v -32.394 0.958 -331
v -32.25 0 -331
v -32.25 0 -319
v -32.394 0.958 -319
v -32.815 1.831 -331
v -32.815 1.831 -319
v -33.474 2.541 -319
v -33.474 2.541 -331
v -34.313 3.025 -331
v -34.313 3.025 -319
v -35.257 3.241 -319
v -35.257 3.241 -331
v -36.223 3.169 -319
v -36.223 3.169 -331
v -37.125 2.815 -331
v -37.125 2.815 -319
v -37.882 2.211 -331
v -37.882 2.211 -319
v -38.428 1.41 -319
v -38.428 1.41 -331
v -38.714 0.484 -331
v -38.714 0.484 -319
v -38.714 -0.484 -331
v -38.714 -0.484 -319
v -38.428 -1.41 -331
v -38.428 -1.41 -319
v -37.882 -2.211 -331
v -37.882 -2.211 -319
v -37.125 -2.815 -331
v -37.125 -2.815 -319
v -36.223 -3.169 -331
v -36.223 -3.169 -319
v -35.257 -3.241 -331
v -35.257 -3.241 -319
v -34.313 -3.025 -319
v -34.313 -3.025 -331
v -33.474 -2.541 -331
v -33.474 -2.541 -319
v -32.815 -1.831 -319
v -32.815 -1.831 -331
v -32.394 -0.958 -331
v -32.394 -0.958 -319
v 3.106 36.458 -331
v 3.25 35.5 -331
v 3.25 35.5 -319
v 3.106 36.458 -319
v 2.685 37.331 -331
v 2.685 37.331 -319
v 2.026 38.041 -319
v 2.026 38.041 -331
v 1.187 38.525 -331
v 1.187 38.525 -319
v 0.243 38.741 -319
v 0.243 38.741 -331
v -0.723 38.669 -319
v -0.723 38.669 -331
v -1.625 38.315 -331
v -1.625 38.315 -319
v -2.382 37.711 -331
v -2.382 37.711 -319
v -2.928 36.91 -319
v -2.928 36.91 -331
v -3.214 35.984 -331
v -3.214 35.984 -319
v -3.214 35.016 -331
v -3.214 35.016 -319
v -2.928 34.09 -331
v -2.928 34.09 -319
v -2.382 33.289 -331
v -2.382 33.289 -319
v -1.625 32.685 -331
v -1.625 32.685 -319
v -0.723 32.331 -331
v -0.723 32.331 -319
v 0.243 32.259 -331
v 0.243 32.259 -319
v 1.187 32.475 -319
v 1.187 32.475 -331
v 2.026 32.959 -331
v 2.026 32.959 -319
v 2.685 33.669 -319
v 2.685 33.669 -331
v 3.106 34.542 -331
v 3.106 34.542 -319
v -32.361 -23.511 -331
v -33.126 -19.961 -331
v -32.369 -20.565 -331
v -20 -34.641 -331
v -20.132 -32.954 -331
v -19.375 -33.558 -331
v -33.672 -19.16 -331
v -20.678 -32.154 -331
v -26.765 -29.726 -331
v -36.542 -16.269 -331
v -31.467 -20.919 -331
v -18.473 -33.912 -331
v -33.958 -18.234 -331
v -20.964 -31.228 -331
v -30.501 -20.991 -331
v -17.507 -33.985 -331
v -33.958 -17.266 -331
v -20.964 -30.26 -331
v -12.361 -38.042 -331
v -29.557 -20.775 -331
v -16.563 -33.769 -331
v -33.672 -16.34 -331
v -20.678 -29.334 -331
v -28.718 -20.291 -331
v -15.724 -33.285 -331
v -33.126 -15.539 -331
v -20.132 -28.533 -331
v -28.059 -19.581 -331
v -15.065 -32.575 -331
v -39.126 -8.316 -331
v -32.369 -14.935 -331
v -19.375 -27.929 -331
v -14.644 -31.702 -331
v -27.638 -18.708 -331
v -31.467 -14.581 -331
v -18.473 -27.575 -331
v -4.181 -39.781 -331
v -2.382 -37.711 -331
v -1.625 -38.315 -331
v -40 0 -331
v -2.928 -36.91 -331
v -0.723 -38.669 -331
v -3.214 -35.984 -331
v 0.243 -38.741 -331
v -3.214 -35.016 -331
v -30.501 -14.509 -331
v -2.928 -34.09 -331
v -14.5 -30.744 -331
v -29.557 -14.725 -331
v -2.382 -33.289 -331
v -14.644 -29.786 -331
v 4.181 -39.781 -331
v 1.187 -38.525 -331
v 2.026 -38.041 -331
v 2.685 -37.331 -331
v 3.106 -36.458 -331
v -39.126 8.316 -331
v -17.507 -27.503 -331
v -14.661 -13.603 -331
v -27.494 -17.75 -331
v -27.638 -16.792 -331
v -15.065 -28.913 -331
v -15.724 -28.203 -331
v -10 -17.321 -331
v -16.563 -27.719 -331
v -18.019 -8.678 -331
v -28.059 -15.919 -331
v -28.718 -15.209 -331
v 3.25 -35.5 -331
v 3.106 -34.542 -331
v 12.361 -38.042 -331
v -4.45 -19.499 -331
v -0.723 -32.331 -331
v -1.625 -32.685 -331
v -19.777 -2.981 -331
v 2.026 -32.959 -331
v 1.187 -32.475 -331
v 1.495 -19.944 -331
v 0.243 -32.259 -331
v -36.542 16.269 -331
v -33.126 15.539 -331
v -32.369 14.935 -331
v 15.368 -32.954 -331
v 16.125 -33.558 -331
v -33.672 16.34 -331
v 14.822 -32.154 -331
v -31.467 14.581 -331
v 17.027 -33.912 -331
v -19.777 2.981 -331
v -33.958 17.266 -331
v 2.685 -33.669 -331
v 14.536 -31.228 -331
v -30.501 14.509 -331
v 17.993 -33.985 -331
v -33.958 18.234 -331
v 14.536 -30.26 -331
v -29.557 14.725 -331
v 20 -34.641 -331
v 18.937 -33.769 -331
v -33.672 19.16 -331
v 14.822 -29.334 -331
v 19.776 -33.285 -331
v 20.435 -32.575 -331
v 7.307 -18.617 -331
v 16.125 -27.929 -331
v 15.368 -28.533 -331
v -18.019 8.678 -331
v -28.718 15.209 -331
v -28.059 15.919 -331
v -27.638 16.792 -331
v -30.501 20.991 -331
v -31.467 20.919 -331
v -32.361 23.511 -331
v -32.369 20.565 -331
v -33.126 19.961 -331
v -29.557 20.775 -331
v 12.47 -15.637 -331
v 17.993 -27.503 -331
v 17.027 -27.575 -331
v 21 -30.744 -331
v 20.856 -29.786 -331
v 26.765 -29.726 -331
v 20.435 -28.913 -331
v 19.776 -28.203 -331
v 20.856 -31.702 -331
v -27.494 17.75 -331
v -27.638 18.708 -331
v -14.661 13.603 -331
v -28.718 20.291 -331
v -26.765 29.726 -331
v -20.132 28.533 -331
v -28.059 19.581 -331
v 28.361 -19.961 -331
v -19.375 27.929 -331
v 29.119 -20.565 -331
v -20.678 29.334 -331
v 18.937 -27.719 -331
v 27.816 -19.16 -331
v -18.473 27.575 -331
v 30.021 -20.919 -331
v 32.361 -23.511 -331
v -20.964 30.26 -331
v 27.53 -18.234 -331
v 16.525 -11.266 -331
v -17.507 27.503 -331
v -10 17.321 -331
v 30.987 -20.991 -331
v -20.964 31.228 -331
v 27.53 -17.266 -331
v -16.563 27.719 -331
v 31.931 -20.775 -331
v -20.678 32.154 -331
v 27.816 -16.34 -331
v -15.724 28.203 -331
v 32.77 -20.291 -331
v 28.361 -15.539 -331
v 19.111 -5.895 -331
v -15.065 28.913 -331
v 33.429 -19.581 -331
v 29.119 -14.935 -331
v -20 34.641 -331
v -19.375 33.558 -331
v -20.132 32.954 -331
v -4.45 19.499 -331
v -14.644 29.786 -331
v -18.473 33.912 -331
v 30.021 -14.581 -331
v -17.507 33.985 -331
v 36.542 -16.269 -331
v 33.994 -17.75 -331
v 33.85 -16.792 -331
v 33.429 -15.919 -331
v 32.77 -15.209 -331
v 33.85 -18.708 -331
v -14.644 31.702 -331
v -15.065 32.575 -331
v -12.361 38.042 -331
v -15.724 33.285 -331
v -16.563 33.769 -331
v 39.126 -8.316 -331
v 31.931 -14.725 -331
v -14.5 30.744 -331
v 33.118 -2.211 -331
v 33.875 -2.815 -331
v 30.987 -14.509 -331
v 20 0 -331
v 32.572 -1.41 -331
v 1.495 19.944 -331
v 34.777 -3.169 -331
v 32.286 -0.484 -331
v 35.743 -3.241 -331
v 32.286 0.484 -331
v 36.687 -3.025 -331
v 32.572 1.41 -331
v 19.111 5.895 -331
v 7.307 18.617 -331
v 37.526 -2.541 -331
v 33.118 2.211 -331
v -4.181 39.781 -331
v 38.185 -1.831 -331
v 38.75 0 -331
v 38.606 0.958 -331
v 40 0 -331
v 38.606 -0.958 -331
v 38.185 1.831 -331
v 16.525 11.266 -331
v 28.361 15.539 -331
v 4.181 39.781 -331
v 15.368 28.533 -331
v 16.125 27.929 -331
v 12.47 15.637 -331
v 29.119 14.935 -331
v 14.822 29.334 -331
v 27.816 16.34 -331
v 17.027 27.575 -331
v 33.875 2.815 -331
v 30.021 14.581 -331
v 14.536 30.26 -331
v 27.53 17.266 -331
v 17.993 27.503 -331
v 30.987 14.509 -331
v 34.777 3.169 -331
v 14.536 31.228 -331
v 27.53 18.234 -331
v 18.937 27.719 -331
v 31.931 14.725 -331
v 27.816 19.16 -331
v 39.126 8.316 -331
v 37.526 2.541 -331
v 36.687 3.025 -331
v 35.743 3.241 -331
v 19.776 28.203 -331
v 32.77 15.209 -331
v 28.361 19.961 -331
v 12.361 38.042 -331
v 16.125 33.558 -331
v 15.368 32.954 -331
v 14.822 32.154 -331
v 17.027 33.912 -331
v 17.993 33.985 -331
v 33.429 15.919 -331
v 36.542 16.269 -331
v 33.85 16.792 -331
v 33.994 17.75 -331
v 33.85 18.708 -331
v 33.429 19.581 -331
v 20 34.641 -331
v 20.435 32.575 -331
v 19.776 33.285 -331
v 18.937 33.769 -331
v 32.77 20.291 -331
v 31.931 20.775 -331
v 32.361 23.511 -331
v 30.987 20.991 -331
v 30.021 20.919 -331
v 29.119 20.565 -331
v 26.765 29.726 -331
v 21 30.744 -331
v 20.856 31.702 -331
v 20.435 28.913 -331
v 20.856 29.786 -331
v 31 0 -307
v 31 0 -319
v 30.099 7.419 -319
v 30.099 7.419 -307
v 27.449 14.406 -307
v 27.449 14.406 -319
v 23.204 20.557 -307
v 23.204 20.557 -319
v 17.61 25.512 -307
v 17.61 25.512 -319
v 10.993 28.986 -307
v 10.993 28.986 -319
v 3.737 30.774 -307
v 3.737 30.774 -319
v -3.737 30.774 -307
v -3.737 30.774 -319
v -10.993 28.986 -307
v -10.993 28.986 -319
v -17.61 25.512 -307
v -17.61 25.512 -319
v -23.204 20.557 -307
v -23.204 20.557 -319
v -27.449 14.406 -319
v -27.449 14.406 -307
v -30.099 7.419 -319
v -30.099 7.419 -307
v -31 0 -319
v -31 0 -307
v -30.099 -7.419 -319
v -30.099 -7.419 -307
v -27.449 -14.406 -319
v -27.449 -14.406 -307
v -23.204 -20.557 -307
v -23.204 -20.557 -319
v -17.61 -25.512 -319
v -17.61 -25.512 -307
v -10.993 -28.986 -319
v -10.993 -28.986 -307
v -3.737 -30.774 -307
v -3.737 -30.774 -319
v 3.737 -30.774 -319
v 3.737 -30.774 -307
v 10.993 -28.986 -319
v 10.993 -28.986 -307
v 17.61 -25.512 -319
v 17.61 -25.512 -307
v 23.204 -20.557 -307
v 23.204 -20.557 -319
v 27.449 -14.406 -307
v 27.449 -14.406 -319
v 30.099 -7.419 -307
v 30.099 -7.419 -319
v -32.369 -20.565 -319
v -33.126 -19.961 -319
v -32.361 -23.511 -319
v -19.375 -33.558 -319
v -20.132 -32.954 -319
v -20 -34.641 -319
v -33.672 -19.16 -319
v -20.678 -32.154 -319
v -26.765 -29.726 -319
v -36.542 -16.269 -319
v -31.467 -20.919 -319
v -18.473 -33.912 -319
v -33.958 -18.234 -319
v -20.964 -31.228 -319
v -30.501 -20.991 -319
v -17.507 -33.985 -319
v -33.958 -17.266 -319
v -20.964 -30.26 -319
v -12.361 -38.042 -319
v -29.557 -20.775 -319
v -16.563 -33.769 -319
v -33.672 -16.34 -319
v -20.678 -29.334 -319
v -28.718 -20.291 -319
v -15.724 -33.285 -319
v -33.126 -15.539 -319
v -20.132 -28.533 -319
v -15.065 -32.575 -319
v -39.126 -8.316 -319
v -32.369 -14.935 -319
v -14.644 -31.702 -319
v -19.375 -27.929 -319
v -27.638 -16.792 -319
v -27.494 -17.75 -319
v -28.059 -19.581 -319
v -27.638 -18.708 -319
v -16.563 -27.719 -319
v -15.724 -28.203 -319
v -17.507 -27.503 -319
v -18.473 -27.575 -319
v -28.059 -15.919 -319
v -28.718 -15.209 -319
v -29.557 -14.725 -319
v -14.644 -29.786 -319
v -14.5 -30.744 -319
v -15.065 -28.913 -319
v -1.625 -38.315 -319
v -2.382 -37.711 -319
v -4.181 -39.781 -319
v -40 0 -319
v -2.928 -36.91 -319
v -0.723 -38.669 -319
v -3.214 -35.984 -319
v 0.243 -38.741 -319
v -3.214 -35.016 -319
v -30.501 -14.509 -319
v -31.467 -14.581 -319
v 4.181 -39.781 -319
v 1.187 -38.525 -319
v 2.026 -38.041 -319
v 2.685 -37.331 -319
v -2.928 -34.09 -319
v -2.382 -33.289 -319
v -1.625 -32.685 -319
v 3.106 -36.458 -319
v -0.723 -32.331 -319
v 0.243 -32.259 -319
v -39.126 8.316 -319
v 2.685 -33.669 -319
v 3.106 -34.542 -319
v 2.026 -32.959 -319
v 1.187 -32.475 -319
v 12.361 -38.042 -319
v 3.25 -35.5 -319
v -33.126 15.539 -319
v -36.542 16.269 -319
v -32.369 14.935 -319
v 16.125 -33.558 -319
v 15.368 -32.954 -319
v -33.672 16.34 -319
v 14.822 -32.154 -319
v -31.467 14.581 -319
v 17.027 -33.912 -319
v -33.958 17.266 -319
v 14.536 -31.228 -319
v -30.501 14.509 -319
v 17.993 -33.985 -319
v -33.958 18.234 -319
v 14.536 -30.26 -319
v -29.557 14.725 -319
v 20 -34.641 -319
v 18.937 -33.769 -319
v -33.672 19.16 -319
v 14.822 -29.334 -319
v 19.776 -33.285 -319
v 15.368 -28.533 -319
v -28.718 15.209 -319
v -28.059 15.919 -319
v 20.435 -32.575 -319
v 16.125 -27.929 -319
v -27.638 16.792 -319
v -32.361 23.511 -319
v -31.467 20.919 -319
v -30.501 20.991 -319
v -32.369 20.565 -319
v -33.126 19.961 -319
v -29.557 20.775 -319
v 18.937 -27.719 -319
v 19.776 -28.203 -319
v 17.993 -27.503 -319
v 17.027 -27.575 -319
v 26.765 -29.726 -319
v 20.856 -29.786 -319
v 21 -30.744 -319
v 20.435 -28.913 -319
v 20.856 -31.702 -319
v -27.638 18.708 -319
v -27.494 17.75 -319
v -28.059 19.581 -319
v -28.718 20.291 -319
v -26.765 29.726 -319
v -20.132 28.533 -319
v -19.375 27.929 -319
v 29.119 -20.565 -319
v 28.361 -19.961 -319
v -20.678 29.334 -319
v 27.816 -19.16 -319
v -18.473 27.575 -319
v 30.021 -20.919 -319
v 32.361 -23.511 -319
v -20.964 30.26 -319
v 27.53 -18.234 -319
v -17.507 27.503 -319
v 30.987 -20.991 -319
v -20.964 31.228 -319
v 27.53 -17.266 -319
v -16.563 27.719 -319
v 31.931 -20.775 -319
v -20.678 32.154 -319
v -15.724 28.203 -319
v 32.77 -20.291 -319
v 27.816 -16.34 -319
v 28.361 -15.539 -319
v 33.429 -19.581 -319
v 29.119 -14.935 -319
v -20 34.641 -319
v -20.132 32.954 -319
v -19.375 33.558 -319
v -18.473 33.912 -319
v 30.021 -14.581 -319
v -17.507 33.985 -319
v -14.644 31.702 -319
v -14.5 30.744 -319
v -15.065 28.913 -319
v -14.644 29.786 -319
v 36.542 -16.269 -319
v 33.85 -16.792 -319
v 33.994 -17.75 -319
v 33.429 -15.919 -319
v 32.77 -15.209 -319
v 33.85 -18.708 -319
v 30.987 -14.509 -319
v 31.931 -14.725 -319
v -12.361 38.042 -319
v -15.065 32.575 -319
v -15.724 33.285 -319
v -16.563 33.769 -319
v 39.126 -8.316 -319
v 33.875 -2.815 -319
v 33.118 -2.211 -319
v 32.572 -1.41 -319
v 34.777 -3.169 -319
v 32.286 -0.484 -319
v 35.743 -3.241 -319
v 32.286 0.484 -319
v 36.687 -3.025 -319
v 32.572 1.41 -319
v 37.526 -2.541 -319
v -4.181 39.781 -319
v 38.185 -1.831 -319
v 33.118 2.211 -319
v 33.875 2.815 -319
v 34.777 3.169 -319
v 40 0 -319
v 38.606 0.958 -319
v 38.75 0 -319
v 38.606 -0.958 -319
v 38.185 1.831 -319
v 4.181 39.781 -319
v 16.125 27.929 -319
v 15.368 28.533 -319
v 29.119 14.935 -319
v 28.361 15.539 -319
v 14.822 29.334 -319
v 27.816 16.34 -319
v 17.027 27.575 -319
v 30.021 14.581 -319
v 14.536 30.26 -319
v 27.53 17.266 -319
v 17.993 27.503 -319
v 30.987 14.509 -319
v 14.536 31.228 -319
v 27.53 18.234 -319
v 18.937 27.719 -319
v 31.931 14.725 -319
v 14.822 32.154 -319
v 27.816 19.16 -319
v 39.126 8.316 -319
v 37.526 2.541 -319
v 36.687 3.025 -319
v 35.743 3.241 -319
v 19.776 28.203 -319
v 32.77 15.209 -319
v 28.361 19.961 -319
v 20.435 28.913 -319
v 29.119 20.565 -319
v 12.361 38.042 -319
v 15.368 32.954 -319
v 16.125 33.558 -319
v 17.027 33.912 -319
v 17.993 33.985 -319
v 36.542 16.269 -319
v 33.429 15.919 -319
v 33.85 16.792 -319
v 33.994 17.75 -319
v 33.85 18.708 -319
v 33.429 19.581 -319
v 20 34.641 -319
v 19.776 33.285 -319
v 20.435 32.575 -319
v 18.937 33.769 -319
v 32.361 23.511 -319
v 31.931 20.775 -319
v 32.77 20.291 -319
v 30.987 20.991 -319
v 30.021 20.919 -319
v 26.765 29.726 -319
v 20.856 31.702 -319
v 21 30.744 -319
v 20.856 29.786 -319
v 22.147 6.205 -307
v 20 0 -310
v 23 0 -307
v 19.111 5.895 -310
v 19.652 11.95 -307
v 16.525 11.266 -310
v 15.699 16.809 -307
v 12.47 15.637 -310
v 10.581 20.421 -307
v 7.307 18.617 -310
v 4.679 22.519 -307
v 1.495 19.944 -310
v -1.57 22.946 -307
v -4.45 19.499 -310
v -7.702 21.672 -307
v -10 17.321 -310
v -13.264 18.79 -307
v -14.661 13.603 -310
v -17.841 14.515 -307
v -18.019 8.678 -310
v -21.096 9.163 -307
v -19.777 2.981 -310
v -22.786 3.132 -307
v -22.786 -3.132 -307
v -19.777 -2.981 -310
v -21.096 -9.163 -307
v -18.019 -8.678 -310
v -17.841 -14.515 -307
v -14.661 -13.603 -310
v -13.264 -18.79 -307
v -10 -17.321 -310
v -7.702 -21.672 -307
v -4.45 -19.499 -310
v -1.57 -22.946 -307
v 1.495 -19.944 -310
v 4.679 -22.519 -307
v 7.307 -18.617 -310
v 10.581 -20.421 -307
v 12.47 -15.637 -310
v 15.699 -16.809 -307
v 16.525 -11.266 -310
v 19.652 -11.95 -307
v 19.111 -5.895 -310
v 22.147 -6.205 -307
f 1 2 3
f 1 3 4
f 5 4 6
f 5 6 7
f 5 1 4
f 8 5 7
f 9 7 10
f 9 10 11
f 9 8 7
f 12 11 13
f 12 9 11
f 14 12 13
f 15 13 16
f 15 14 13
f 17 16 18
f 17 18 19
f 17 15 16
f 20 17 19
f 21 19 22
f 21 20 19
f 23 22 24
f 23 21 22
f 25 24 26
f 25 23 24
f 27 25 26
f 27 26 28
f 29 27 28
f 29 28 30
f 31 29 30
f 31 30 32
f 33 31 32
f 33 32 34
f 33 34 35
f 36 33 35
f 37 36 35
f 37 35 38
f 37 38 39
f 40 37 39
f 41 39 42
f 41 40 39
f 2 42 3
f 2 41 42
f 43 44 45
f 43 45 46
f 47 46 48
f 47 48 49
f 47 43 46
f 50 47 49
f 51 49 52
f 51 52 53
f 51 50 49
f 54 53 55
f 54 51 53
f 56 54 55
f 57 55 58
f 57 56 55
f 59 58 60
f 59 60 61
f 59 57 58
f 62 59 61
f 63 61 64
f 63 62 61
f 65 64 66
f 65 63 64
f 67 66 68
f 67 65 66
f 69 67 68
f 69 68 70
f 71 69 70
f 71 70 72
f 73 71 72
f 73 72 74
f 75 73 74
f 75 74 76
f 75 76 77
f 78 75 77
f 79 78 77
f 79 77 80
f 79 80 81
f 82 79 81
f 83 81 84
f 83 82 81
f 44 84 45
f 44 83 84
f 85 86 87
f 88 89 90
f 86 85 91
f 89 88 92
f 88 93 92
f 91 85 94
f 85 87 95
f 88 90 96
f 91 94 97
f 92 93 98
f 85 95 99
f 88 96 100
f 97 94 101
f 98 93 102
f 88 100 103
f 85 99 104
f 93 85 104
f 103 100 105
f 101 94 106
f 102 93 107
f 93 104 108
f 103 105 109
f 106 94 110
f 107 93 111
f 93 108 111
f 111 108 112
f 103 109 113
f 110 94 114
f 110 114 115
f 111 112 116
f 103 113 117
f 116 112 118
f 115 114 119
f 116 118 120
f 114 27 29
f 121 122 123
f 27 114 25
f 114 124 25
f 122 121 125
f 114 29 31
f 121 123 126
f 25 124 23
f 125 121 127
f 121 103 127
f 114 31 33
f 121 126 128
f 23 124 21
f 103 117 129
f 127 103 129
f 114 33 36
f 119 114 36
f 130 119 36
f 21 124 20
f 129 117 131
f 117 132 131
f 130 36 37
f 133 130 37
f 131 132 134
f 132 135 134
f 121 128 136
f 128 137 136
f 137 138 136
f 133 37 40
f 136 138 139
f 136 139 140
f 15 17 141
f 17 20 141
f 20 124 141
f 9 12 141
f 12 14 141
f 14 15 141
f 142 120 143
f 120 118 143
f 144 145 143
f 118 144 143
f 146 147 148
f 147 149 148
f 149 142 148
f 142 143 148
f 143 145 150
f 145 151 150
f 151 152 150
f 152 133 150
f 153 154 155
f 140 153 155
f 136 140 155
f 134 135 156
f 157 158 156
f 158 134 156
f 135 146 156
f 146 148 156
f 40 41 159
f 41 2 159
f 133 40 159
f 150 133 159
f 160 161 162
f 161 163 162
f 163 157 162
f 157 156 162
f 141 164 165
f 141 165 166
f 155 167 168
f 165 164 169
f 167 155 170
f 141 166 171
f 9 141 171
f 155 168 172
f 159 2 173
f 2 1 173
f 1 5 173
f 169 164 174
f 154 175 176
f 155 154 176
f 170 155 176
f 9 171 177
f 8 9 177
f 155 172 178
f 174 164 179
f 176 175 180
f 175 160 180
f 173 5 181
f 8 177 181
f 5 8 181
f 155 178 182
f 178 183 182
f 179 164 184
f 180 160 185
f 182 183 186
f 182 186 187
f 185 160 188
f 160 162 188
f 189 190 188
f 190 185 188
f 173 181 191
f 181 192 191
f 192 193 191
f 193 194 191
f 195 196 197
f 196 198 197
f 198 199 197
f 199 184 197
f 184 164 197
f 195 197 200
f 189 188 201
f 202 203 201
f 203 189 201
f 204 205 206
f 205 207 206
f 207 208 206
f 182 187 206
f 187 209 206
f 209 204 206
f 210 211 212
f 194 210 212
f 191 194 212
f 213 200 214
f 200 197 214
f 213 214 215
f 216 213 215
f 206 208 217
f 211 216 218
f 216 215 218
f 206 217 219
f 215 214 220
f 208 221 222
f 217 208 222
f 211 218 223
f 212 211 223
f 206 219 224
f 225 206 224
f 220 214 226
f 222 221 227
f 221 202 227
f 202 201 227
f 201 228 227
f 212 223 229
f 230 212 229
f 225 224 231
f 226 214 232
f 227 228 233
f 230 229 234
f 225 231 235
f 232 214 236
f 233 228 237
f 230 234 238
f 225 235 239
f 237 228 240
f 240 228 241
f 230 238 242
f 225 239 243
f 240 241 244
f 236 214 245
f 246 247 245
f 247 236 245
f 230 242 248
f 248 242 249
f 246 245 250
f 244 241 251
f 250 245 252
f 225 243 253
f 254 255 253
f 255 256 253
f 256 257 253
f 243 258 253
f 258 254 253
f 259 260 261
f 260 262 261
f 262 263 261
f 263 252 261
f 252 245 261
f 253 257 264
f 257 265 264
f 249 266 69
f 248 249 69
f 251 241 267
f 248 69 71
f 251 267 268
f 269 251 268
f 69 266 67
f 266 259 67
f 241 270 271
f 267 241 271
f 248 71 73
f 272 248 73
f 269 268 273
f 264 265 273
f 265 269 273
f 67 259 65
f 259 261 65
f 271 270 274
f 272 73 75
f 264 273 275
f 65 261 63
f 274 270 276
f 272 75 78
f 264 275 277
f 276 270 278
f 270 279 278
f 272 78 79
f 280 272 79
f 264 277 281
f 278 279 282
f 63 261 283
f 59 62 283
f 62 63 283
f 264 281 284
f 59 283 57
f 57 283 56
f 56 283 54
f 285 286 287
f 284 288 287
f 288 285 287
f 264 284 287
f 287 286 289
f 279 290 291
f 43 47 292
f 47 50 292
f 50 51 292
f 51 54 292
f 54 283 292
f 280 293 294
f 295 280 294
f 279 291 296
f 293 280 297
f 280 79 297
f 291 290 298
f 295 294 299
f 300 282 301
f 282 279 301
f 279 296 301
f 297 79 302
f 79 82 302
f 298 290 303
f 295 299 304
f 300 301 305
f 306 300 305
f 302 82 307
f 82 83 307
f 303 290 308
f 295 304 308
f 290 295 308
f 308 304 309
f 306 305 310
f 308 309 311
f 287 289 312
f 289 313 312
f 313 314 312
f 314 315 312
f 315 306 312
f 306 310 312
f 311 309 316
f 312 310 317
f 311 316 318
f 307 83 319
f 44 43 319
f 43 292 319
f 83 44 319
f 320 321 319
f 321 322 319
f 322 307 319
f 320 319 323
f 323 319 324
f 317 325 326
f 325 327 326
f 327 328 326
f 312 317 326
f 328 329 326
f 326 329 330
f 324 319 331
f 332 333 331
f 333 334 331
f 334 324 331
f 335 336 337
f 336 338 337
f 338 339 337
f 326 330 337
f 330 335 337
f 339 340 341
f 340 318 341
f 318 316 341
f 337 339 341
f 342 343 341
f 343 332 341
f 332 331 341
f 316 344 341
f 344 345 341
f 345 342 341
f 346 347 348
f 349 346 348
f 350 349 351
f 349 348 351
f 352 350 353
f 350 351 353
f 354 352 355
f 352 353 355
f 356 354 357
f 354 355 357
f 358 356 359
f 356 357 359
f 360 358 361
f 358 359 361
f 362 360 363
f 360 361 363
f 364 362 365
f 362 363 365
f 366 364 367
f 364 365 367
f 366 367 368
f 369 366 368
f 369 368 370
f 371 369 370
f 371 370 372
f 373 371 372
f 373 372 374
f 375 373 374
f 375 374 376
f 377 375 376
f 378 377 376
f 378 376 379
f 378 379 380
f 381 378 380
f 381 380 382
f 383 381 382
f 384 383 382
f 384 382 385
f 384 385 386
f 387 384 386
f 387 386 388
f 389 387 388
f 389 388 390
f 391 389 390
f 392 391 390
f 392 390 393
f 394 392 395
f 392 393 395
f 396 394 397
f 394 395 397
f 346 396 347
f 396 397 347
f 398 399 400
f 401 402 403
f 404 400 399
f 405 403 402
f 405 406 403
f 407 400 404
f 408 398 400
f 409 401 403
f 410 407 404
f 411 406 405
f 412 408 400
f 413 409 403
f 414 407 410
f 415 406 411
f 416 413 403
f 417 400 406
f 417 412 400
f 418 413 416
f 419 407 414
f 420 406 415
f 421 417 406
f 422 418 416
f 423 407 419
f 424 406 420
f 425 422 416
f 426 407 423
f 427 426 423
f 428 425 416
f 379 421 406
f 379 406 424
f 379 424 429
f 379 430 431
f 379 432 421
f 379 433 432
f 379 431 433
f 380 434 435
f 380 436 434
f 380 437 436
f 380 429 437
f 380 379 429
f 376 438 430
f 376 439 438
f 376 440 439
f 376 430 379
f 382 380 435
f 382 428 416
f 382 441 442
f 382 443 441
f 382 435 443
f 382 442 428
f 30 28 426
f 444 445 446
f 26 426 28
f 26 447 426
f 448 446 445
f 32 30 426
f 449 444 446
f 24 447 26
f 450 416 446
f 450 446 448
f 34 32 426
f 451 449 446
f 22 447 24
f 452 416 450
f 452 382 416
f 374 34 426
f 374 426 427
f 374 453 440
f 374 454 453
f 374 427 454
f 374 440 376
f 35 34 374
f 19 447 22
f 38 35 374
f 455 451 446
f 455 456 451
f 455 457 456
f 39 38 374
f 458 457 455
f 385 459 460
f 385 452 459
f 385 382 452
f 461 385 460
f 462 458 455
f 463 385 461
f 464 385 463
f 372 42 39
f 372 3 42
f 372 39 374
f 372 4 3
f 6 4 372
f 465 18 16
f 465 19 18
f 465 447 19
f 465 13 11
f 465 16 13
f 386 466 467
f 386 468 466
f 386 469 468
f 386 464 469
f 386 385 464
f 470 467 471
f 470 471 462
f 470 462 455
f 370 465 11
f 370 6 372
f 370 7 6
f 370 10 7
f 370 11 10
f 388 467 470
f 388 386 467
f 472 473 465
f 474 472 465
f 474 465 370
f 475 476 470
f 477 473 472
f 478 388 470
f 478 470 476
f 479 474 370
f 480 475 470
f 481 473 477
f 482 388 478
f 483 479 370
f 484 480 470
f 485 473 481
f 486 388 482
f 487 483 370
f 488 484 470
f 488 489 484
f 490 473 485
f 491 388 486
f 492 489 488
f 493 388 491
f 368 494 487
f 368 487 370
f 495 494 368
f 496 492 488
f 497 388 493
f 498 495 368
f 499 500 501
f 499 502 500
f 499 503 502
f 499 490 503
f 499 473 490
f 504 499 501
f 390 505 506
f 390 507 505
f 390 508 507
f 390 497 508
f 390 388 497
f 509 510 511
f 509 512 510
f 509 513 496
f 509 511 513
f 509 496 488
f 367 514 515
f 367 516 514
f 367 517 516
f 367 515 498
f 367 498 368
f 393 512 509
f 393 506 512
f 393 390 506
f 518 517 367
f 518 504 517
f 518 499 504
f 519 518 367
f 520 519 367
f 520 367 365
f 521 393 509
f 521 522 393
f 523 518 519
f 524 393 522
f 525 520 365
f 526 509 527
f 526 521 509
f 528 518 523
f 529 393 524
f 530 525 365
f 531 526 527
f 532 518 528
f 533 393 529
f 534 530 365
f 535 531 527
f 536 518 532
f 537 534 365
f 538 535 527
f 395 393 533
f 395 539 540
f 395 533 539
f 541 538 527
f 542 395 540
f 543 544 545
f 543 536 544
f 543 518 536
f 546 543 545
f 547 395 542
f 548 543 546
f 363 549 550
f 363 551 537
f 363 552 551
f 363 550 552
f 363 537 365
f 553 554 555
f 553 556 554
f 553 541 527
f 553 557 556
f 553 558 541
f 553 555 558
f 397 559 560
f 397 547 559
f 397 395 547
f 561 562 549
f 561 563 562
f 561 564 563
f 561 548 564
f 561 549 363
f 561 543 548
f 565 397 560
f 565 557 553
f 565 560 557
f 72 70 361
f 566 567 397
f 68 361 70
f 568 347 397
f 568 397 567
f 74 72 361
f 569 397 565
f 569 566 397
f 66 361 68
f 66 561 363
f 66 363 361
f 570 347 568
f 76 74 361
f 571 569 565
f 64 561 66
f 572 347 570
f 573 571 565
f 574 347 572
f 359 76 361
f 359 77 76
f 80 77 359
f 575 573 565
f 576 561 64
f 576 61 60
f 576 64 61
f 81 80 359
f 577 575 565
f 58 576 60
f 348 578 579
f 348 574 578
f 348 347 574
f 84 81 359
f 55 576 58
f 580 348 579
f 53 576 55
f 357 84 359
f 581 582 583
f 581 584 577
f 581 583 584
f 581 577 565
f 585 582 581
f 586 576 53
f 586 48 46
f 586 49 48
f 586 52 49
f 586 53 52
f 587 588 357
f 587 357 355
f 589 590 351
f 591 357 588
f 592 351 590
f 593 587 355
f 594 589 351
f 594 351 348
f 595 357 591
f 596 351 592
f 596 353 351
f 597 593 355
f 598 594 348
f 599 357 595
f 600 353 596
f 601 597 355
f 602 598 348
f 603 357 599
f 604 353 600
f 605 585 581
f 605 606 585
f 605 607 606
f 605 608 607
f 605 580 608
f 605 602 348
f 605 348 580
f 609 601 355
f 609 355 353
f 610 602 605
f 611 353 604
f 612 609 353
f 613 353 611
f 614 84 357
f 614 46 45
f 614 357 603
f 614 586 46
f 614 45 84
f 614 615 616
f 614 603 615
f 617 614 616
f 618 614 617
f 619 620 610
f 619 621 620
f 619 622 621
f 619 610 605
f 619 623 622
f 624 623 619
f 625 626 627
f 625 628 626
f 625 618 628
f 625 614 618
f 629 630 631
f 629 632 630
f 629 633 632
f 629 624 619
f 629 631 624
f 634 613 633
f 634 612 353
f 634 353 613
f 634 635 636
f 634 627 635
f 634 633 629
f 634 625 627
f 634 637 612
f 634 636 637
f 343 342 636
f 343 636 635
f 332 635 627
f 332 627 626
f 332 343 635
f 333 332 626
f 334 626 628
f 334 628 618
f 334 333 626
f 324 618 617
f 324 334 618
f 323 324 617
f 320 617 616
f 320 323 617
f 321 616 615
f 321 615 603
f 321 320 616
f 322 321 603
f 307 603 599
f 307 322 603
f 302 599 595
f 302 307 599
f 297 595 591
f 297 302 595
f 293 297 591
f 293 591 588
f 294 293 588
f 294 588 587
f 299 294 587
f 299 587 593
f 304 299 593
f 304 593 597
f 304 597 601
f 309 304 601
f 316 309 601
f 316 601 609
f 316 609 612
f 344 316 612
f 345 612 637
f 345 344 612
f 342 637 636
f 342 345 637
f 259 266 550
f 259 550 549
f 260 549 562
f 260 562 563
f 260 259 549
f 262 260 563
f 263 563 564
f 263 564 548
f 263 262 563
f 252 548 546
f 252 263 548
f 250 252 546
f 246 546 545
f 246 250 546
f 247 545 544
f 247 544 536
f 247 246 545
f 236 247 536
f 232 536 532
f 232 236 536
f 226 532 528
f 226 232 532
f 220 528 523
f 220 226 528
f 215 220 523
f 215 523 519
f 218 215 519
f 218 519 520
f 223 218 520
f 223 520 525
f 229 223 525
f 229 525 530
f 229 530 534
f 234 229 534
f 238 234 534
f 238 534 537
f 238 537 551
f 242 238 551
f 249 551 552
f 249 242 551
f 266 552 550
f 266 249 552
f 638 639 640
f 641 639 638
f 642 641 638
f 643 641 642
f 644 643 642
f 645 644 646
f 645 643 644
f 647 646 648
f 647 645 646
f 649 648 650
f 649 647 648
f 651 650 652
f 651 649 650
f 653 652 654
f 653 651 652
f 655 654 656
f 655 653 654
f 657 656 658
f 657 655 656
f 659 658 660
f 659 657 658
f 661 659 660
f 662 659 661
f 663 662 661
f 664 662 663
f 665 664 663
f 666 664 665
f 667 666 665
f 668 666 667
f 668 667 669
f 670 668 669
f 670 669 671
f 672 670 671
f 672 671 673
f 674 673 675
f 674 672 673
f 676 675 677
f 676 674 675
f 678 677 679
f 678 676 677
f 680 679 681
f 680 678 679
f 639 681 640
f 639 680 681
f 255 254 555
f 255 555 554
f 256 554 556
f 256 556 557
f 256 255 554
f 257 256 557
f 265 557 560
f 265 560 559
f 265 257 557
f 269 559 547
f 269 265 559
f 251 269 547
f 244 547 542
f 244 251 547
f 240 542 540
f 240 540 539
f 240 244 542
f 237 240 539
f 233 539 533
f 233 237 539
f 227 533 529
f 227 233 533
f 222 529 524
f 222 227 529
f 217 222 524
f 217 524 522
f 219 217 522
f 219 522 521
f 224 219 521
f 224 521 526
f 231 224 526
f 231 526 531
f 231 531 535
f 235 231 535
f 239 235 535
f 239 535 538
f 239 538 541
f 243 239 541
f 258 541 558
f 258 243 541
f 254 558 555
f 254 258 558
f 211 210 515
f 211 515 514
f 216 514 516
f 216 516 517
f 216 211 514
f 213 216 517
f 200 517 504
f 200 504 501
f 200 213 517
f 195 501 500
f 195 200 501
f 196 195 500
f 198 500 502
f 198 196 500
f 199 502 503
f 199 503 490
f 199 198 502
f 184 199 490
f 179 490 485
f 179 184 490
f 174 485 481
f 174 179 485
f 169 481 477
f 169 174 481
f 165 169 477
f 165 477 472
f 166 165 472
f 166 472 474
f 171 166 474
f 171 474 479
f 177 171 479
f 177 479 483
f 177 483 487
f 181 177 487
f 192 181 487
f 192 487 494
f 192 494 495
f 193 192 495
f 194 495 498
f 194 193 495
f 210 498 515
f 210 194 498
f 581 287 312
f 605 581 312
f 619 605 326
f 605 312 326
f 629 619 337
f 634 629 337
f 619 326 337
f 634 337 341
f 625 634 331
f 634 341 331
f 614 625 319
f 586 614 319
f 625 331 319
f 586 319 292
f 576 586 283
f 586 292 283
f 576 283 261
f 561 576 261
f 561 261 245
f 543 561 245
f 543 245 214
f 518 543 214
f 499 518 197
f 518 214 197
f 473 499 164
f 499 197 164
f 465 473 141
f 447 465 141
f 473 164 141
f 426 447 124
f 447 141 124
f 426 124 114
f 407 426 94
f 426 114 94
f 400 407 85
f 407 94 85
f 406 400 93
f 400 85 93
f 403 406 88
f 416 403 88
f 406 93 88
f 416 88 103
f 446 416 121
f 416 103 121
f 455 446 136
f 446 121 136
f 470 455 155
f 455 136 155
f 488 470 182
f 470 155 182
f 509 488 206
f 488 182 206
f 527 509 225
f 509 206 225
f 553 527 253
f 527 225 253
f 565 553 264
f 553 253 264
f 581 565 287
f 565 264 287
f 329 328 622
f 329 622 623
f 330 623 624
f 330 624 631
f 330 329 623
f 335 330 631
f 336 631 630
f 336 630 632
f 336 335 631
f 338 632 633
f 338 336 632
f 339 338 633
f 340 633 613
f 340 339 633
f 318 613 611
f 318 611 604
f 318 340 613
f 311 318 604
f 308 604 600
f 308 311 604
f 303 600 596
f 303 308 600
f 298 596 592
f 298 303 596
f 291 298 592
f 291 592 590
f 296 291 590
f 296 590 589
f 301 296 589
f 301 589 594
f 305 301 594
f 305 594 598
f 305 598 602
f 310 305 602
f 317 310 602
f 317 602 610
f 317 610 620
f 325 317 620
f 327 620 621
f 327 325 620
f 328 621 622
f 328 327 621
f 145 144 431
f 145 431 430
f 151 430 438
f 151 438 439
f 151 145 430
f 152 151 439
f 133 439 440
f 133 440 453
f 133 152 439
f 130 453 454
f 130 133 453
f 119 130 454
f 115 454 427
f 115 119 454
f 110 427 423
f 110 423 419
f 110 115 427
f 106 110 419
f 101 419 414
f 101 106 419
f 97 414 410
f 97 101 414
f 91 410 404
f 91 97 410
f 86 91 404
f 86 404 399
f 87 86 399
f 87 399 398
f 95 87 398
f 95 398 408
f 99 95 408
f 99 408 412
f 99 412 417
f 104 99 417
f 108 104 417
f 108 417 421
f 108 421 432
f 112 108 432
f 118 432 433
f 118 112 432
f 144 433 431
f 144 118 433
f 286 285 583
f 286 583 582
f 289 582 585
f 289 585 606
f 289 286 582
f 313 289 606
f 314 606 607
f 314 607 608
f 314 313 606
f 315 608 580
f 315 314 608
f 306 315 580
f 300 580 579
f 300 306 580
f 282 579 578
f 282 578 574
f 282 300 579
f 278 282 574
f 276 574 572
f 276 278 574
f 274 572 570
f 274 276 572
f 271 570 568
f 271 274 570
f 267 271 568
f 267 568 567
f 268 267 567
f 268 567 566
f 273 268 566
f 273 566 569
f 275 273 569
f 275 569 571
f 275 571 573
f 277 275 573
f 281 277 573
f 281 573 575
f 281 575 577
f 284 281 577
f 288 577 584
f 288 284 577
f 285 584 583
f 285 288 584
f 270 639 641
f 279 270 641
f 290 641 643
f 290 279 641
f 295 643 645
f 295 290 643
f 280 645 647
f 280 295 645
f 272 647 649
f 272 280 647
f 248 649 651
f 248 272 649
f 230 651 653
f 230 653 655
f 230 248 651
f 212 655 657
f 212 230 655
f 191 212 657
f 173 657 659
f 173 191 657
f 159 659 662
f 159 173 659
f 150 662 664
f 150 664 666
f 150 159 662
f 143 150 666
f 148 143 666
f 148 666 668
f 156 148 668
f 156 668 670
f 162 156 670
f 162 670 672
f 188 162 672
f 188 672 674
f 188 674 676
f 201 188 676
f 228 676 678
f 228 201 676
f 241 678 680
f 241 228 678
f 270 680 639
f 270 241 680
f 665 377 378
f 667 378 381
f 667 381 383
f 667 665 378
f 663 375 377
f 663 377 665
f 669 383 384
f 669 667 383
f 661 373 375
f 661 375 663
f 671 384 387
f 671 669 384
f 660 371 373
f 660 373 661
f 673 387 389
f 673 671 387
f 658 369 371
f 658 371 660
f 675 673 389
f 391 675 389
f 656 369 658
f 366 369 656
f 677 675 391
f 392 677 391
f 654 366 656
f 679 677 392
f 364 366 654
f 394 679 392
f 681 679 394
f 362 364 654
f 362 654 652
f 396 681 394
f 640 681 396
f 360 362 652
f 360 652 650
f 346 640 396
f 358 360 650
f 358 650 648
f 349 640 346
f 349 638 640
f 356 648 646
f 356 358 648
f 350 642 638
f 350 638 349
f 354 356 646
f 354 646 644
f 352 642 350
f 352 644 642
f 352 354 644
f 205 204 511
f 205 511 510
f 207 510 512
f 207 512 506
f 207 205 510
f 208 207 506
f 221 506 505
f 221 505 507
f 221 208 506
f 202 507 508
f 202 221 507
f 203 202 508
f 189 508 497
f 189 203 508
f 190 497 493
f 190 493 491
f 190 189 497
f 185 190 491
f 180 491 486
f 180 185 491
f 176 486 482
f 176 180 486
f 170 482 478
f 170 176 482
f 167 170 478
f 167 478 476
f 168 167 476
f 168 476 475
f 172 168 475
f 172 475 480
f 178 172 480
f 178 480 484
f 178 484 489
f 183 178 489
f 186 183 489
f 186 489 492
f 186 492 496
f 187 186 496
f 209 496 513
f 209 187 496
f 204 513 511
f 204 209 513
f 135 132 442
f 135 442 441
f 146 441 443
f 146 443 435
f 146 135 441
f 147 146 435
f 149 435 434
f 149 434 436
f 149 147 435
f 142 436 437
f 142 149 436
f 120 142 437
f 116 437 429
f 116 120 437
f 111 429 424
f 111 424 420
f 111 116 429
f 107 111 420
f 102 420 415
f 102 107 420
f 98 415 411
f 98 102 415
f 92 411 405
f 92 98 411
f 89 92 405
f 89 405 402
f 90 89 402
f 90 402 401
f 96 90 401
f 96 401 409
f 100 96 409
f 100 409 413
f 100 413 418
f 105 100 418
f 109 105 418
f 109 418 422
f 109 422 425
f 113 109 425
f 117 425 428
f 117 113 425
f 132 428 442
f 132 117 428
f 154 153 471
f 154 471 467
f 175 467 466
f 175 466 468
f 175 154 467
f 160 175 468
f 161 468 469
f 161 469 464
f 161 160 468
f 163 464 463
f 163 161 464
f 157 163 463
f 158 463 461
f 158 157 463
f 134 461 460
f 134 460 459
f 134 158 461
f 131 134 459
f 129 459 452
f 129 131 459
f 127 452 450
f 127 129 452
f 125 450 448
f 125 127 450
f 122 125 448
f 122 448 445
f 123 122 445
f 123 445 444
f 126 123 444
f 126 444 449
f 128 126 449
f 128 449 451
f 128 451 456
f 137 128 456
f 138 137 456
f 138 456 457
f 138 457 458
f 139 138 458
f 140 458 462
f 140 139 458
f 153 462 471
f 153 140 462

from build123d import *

# Parameters (mm, degrees)
STOCK_PPV4_2_START                       = -331
STOCK_PPV4_2_EXTRUDER_MB_1_OUTLINE_R     = 31
STOCK_PPV4_2_EXTRUDER_MB_1_OUTLINE_R_2   = 20
STOCK_PPV4_2_EXTRUDER_MB_1_DEPTH         = 24
STOCK_PPV4_2_EXTRUDER_MB_1_2_OUTLINE_R   = 40
STOCK_PPV4_2_EXTRUDER_MB_1_2_OUTLINE_R_2 = 3.3
STOCK_PPV4_2_EXTRUDER_MB_1_2_OUTLINE_R_3 = 31
STOCK_PPV4_2_EXTRUDER_MB_1_2_DEPTH       = 12
MOVE_FACE1_BY                            = 0.05
MOVE_FACE1_2_BY                          = 0.05
MOVE_FACE1_3_BY                          = 0.05
MOVE_FACE1_4_BY                          = 0.05
MOVE_FACE1_5_BY                          = 0.05
MOVE_FACE1_6_BY                          = 0.05
MOVE_FACE1_7_BY                          = 0.05
MOVE_FACE1_8_BY                          = 0.05
MOVE_FACE1_9_BY                          = 0.05
MOVE_FACE1_10_BY                         = 0.05
MOVE_FACE1_11_BY                         = 0.05
MOVE_FACE1_12_BY                         = 0.05
CHAMFER1_SIZE                            = 3


# Read off the part's stored shape, not the designer's step: Stock-PPV4.2 - Extruder - MB-1
with BuildPart() as part:
    # Stock-PPV4.2 - Extruder - MB-1 outline → Stock-PPV4.2 - Extruder - MB-1 (new body)
    with BuildSketch(Plane.XY.offset(STOCK_PPV4_2_START)):
        Circle(STOCK_PPV4_2_EXTRUDER_MB_1_OUTLINE_R)
        Circle(STOCK_PPV4_2_EXTRUDER_MB_1_OUTLINE_R_2, mode=Mode.SUBTRACT)
    extrude(amount=STOCK_PPV4_2_EXTRUDER_MB_1_DEPTH)

    # Stock-PPV4.2 - Extruder - MB-1 2 outline → Stock-PPV4.2 - Extruder - MB-1 2 (add)
    with BuildSketch(Plane.XY.offset(STOCK_PPV4_2_START)):
        Circle(STOCK_PPV4_2_EXTRUDER_MB_1_2_OUTLINE_R)
        with Locations((-17.75, -30.743901834)):
            Circle(STOCK_PPV4_2_EXTRUDER_MB_1_2_OUTLINE_R_2, mode=Mode.SUBTRACT)
        with Locations((-30.743901834, -17.75)):
            Circle(STOCK_PPV4_2_EXTRUDER_MB_1_2_OUTLINE_R_2, mode=Mode.SUBTRACT)
        with Locations((0, -35.5)):
            Circle(STOCK_PPV4_2_EXTRUDER_MB_1_2_OUTLINE_R_2, mode=Mode.SUBTRACT)
        with Locations((17.75, -30.743901834)):
            Circle(STOCK_PPV4_2_EXTRUDER_MB_1_2_OUTLINE_R_2, mode=Mode.SUBTRACT)
        with Locations((30.743901834, -17.75)):
            Circle(STOCK_PPV4_2_EXTRUDER_MB_1_2_OUTLINE_R_2, mode=Mode.SUBTRACT)
        with Locations((-35.5, 0)):
            Circle(STOCK_PPV4_2_EXTRUDER_MB_1_2_OUTLINE_R_2, mode=Mode.SUBTRACT)
        with Locations((-30.743901834, 17.75)):
            Circle(STOCK_PPV4_2_EXTRUDER_MB_1_2_OUTLINE_R_2, mode=Mode.SUBTRACT)
        with Locations((-17.75, 30.743901834)):
            Circle(STOCK_PPV4_2_EXTRUDER_MB_1_2_OUTLINE_R_2, mode=Mode.SUBTRACT)
        Circle(STOCK_PPV4_2_EXTRUDER_MB_1_2_OUTLINE_R_3, mode=Mode.SUBTRACT)
        with Locations((35.5, 0)):
            Circle(STOCK_PPV4_2_EXTRUDER_MB_1_2_OUTLINE_R_2, mode=Mode.SUBTRACT)
        with Locations((30.743901834, 17.75)):
            Circle(STOCK_PPV4_2_EXTRUDER_MB_1_2_OUTLINE_R_2, mode=Mode.SUBTRACT)
        with Locations((0, 35.5)):
            Circle(STOCK_PPV4_2_EXTRUDER_MB_1_2_OUTLINE_R_2, mode=Mode.SUBTRACT)
        with Locations((17.75, 30.743901834)):
            Circle(STOCK_PPV4_2_EXTRUDER_MB_1_2_OUTLINE_R_2, mode=Mode.SUBTRACT)
    extrude(amount=STOCK_PPV4_2_EXTRUDER_MB_1_2_DEPTH)

    # Move Face1: a curved face moved outward by 0.05
    add(Solid.thicken(part.faces().sort_by_distance((27.443901834, -17.75, -325))[0], MOVE_FACE1_BY))

    # Move Face1 2: a curved face moved outward by 0.05
    add(Solid.thicken(part.faces().sort_by_distance((14.45, -30.743901834, -325))[0], MOVE_FACE1_2_BY))

    # Move Face1 3: a curved face moved outward by 0.05
    add(Solid.thicken(part.faces().sort_by_distance((32.2, 0, -325))[0], MOVE_FACE1_3_BY))

    # Move Face1 4: a curved face moved outward by 0.05
    add(Solid.thicken(part.faces().sort_by_distance((27.443901834, 17.75, -325))[0], MOVE_FACE1_4_BY))

    # Move Face1 5: a curved face moved outward by 0.05
    add(Solid.thicken(part.faces().sort_by_distance((14.45, 30.743901834, -325))[0], MOVE_FACE1_5_BY))

    # Move Face1 6: a curved face moved outward by 0.05
    add(Solid.thicken(part.faces().sort_by_distance((-3.3, 35.5, -325))[0], MOVE_FACE1_6_BY))

    # Move Face1 7: a curved face moved outward by 0.05
    add(Solid.thicken(part.faces().sort_by_distance((-21.05, 30.743901834, -325))[0], MOVE_FACE1_7_BY))

    # Move Face1 8: a curved face moved outward by 0.05
    add(Solid.thicken(part.faces().sort_by_distance((-34.043901834, 17.75, -325))[0], MOVE_FACE1_8_BY))

    # Move Face1 9: a curved face moved outward by 0.05
    add(Solid.thicken(part.faces().sort_by_distance((-38.8, 0, -325))[0], MOVE_FACE1_9_BY))

    # Move Face1 10: a curved face moved outward by 0.05
    add(Solid.thicken(part.faces().sort_by_distance((-34.043901834, -17.75, -325))[0], MOVE_FACE1_10_BY))

    # Move Face1 11: a curved face moved outward by 0.05
    add(Solid.thicken(part.faces().sort_by_distance((-21.05, -30.743901834, -325))[0], MOVE_FACE1_11_BY))

    # Move Face1 12: a curved face moved outward by 0.05
    add(Solid.thicken(part.faces().sort_by_distance((-3.3, -35.5, -325))[0], MOVE_FACE1_12_BY))

    # Chamfer1
    chamfer1_edges = [part.edges().sort_by_distance(p)[0] for p in [
        (-20, 0, -307),
    ]]
    chamfer(chamfer1_edges, length=CHAMFER1_SIZE)


solid = part.part
